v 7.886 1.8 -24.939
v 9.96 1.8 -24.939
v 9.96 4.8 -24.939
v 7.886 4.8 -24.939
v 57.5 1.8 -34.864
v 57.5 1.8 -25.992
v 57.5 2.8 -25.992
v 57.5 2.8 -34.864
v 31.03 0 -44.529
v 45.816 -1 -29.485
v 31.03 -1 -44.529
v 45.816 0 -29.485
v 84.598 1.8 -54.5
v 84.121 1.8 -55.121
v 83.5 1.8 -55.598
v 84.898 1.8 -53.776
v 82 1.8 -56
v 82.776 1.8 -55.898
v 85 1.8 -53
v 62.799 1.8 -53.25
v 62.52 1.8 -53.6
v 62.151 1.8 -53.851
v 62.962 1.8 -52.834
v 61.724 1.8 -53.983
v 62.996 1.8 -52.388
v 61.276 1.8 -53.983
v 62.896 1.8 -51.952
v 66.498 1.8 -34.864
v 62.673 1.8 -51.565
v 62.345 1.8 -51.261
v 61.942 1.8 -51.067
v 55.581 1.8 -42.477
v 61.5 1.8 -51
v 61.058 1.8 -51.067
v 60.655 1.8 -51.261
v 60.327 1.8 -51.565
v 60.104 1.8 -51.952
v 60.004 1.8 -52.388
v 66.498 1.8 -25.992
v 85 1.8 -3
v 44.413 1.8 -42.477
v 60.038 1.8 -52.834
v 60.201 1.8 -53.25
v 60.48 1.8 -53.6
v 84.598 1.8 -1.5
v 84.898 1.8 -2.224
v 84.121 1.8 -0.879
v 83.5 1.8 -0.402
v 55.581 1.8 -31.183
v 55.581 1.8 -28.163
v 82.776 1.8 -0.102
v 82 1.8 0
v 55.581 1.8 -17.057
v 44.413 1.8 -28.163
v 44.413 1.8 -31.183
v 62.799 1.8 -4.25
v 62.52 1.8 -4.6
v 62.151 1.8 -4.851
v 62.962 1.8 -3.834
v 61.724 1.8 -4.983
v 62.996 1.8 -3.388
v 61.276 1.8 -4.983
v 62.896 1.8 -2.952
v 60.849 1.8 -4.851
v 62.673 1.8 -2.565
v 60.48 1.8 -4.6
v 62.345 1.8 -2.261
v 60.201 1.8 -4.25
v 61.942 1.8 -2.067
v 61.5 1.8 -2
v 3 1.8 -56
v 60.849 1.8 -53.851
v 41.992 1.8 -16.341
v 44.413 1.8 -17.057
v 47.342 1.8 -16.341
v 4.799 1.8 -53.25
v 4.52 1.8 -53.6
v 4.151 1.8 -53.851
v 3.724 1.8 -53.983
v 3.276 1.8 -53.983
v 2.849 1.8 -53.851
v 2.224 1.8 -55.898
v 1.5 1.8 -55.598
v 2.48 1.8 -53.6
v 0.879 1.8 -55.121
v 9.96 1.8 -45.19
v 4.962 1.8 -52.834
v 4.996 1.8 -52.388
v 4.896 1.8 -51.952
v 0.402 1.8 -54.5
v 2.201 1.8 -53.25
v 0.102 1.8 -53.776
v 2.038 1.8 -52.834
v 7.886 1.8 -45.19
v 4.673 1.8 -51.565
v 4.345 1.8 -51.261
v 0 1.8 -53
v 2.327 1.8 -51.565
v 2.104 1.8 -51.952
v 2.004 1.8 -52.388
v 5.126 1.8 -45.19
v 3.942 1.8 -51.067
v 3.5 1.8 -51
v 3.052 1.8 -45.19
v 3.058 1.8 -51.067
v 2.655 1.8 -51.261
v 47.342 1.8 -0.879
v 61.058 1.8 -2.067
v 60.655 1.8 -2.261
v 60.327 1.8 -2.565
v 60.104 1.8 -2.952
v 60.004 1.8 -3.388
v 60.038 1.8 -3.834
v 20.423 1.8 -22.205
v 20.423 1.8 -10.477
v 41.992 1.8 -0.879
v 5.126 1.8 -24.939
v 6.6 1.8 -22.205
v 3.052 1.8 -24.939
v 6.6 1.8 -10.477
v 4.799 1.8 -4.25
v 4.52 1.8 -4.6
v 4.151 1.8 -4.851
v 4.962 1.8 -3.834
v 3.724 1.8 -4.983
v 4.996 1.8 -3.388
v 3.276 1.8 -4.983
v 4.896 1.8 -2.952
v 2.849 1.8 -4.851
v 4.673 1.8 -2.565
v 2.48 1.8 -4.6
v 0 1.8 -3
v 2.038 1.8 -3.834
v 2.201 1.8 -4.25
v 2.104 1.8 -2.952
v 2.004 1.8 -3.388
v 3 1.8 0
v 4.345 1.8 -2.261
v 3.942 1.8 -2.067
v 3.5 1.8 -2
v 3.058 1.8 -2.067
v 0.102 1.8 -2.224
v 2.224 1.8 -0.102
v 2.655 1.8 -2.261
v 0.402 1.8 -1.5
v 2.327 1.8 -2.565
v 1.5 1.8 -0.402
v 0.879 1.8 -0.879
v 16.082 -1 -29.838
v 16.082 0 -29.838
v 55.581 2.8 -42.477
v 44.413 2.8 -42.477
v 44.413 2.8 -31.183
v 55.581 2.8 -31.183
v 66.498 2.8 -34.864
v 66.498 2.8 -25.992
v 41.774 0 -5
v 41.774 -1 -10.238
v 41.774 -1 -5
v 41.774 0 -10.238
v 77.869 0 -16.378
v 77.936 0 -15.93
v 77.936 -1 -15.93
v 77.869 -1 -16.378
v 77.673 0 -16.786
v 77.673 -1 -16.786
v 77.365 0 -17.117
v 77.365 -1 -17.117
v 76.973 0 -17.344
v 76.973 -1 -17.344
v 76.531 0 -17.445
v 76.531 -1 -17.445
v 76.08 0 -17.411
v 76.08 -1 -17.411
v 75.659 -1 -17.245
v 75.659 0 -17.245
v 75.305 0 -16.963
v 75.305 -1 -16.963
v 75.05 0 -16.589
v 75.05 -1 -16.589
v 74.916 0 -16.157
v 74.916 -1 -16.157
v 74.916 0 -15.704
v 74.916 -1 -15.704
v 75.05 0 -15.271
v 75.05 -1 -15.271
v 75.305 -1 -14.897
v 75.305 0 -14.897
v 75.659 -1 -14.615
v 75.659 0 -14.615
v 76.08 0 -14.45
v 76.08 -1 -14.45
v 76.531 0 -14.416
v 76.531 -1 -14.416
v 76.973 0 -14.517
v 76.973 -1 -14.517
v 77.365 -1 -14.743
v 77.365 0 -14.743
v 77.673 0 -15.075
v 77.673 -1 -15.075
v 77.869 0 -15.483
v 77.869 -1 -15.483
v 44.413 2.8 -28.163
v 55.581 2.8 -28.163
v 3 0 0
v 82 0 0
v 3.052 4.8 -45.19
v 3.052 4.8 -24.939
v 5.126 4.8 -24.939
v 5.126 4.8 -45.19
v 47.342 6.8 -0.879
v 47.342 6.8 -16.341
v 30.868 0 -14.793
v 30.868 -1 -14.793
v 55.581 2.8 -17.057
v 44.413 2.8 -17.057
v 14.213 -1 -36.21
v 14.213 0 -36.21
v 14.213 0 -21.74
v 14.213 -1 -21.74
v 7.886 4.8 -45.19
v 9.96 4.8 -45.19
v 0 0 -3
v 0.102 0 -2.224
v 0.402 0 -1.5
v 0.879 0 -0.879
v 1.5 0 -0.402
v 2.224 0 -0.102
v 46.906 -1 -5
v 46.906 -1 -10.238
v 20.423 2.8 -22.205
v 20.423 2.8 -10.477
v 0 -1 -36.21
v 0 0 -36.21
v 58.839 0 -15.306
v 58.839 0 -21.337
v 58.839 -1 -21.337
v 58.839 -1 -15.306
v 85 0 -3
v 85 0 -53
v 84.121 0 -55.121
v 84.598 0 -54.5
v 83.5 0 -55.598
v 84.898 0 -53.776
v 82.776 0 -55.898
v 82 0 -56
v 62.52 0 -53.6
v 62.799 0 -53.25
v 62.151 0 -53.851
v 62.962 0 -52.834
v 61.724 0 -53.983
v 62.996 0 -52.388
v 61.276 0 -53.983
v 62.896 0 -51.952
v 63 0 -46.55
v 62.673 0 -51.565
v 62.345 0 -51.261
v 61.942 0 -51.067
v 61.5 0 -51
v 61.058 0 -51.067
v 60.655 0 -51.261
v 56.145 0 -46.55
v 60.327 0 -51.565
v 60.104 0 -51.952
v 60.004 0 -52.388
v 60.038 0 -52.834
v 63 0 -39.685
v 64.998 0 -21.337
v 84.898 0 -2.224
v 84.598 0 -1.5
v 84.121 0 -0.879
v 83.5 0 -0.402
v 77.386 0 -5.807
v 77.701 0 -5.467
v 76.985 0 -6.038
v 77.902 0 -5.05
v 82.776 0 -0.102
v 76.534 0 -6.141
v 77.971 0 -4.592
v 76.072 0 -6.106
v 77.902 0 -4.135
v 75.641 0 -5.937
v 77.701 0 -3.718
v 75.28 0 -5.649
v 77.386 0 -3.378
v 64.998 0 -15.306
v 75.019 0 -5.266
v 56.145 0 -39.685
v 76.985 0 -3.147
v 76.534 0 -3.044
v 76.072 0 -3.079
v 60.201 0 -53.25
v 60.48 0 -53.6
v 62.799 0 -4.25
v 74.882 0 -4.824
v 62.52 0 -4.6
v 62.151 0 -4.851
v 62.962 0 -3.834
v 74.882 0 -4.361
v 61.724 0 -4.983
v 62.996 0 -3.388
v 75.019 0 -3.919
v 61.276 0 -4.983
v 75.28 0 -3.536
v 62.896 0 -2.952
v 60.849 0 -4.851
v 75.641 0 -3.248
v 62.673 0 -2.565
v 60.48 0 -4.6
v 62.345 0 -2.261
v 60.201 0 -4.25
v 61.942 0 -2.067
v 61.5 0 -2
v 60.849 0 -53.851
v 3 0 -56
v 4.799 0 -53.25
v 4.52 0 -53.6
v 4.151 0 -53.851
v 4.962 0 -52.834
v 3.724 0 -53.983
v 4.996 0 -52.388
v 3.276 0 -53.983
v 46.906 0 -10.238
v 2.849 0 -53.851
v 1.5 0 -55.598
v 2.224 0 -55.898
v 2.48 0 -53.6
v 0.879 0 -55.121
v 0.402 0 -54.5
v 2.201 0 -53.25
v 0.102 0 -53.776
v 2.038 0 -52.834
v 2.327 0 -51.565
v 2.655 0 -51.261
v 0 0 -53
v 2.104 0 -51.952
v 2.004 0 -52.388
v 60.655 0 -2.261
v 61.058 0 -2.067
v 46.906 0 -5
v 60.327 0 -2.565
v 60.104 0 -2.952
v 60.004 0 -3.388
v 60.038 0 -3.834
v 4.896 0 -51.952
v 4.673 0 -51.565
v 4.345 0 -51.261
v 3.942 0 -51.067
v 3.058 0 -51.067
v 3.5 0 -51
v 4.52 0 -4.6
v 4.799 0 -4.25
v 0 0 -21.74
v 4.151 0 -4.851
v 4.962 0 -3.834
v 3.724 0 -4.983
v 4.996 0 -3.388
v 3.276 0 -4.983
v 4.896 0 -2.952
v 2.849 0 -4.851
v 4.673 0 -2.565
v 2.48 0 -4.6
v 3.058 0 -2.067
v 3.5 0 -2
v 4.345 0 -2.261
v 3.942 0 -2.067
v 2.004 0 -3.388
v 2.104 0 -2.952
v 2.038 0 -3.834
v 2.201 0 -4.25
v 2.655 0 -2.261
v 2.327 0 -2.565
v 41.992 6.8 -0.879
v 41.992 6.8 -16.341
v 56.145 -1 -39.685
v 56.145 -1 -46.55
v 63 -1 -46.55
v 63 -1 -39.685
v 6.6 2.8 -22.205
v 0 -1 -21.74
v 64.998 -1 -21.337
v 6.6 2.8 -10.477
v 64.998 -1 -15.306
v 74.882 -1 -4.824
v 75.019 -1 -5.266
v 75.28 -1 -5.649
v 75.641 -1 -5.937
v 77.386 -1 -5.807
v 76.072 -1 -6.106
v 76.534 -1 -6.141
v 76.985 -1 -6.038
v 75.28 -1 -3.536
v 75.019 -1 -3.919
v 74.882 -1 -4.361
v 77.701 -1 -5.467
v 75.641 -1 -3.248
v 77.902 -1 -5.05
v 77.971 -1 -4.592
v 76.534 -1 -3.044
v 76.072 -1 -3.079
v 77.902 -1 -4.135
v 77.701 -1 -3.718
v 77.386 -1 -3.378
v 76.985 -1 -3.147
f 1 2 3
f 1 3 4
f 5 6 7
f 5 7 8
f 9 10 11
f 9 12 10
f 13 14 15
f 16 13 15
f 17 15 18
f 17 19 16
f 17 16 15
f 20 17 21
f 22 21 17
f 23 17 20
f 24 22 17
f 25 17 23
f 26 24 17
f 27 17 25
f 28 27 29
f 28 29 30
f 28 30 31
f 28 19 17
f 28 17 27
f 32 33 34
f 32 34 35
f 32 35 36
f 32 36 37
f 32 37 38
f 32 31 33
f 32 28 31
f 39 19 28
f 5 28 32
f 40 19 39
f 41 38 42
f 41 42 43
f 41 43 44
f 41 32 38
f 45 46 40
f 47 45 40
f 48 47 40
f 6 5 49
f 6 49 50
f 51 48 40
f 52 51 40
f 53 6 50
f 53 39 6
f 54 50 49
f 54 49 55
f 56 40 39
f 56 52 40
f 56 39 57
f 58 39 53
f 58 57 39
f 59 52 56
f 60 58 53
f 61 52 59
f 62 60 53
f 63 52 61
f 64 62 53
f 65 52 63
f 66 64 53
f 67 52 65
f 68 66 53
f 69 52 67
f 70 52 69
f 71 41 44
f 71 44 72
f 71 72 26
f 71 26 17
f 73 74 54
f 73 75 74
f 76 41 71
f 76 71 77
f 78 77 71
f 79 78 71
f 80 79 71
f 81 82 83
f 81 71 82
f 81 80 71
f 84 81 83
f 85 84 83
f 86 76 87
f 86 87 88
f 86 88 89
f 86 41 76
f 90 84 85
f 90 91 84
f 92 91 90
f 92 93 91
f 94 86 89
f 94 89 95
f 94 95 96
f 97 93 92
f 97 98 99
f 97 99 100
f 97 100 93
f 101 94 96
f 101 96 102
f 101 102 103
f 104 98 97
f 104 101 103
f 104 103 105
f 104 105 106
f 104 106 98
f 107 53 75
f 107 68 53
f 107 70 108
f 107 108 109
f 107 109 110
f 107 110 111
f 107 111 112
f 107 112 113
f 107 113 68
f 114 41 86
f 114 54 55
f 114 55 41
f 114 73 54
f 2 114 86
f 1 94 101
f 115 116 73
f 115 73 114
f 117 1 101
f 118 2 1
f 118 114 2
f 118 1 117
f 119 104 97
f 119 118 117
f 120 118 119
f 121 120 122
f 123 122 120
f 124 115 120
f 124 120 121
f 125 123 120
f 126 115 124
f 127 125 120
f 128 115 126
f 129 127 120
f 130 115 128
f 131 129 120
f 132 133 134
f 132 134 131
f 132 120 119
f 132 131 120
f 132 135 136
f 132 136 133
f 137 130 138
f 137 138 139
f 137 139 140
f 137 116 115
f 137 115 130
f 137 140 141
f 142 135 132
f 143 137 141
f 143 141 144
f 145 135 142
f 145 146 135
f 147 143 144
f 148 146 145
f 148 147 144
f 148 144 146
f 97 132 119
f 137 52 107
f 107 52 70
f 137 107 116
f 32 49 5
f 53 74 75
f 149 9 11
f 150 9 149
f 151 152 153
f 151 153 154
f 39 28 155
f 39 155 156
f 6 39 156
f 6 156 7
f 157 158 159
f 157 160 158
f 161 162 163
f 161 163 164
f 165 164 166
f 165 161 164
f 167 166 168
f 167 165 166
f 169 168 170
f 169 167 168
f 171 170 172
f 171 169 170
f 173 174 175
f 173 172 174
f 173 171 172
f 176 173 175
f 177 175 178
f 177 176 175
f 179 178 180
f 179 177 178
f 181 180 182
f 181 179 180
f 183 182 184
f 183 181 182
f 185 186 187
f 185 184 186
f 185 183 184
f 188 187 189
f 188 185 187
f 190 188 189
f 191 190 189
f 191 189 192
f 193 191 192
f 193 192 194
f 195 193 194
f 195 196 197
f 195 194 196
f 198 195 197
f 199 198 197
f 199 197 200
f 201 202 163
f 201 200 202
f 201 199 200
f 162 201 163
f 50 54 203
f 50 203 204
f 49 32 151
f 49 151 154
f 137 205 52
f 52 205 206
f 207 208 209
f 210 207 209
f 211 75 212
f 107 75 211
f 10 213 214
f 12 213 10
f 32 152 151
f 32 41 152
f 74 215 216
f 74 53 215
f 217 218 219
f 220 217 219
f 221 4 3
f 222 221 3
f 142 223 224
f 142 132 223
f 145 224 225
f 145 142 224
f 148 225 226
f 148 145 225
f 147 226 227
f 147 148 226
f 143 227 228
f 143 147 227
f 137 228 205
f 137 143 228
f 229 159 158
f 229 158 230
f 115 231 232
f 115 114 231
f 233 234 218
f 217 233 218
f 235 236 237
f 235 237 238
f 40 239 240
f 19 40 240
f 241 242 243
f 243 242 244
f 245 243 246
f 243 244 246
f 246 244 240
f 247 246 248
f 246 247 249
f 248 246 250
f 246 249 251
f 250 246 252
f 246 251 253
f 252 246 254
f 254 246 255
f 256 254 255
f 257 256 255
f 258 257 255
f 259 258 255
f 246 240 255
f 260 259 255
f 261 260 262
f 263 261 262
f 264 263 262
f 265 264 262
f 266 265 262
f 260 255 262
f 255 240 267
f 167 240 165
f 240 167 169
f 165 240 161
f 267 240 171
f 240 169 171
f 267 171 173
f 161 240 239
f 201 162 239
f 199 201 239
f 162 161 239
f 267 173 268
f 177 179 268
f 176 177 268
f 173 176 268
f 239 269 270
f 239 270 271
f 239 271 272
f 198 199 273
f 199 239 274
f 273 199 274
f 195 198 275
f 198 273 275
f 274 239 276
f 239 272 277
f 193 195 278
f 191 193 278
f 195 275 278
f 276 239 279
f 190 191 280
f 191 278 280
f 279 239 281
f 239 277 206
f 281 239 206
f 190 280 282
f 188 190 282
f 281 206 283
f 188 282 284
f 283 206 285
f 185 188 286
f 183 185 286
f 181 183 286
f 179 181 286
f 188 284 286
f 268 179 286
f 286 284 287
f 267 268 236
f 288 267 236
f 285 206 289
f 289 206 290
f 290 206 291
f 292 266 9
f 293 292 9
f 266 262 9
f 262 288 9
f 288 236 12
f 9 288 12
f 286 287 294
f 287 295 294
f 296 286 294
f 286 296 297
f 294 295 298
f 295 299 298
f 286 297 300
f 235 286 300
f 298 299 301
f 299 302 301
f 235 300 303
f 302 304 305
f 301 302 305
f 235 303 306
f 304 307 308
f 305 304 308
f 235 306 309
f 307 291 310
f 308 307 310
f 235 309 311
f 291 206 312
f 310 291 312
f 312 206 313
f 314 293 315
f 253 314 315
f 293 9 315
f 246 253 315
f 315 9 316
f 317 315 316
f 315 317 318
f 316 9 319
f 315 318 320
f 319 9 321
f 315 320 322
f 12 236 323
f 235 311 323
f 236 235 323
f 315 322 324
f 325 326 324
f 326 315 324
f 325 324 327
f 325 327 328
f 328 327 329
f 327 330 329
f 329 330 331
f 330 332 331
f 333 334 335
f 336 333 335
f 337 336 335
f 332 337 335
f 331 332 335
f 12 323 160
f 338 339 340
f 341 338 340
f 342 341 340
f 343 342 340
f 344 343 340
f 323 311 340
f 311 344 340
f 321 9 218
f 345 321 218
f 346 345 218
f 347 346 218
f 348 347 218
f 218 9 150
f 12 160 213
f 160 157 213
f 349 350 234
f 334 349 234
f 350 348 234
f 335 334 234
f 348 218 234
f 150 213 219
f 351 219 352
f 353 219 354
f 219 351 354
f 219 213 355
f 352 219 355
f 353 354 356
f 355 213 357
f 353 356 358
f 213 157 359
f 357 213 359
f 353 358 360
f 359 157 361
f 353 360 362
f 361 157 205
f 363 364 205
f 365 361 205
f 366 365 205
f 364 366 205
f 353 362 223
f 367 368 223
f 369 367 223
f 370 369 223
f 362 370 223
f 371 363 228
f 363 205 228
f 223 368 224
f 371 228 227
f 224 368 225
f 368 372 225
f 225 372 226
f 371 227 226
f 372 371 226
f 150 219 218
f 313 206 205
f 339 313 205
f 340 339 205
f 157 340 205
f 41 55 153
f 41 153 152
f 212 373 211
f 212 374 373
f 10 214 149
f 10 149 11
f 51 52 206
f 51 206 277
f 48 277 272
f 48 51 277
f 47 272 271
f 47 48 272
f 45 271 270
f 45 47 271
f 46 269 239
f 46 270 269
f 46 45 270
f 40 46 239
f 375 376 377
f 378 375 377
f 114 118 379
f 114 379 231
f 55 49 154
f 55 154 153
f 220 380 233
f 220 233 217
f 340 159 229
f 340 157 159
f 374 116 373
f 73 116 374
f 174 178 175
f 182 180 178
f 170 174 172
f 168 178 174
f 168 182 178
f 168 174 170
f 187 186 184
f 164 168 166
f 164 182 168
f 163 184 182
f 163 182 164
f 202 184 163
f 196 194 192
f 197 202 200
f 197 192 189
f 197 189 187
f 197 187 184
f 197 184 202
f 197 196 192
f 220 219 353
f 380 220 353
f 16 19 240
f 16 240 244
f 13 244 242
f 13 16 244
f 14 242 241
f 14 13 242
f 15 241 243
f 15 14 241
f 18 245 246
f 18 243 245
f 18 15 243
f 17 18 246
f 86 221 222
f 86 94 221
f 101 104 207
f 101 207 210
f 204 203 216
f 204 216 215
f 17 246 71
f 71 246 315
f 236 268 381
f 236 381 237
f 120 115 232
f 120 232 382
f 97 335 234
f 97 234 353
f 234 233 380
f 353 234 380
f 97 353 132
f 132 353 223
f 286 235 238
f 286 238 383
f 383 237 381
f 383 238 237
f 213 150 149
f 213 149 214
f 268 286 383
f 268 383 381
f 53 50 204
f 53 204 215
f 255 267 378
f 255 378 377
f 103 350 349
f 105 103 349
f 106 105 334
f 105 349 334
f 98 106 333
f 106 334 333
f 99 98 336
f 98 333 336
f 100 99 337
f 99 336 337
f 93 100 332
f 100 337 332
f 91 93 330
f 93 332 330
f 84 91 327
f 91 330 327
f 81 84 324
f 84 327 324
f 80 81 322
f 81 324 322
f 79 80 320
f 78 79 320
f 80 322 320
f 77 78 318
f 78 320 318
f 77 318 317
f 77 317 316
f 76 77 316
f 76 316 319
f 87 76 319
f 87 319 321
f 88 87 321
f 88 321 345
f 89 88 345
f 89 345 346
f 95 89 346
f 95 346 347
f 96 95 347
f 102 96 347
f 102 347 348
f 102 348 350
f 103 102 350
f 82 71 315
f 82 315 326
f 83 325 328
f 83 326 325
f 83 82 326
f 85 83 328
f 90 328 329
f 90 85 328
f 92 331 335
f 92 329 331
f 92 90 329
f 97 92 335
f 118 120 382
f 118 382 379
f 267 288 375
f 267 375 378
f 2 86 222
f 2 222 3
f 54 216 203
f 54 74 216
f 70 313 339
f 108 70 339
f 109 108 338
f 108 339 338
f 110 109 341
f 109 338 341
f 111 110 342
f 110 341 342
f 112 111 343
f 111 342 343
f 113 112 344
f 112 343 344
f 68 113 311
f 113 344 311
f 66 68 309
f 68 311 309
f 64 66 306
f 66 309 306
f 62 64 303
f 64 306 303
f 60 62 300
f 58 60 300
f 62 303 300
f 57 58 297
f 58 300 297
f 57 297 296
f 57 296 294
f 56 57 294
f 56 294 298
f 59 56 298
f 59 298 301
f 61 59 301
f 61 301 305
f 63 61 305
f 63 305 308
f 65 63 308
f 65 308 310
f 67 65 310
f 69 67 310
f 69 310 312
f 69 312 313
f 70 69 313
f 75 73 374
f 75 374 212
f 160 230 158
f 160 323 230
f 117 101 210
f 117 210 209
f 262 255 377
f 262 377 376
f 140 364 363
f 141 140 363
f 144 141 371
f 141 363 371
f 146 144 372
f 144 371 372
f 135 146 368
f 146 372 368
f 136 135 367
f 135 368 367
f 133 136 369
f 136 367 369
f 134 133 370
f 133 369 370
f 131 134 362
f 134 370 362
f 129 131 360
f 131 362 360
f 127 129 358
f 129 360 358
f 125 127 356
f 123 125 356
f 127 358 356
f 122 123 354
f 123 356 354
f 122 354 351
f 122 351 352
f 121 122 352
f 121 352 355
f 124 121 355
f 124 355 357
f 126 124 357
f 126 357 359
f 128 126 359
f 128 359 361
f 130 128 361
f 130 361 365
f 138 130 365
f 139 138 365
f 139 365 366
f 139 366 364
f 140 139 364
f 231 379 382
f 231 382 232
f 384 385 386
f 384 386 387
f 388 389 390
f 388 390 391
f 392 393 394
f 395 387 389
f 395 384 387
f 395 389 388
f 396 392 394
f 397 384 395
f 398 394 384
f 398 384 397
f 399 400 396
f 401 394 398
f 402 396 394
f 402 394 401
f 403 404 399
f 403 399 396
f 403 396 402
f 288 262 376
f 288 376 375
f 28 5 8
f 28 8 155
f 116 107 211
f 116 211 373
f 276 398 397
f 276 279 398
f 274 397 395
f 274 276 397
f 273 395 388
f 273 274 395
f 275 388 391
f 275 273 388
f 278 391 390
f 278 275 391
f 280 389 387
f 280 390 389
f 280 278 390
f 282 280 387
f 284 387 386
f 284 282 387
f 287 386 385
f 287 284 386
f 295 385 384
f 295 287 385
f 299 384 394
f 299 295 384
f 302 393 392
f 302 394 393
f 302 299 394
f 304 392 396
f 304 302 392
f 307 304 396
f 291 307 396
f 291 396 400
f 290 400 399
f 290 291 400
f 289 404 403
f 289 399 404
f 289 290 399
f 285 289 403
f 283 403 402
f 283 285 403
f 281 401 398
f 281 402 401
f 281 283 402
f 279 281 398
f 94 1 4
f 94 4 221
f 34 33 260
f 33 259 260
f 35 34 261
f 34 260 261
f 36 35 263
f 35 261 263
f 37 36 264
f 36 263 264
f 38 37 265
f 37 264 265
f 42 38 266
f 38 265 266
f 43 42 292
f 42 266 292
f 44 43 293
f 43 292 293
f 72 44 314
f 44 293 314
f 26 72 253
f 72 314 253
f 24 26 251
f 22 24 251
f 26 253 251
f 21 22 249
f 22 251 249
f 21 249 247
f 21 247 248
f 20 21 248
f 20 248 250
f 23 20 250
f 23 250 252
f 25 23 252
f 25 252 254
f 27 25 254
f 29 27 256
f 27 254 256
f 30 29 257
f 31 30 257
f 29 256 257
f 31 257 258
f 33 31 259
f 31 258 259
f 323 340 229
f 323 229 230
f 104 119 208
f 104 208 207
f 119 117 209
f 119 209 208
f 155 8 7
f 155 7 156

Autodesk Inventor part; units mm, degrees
ref_plane "YZ Plane" through (0, 0, 0) normal (1, 0, 0) x (0, 1, 0)
ref_plane "XZ Plane" through (0, 0, 0) normal (0, 1, 0) x (-1, 0, 0)
ref_plane "XY Plane" through (0, 0, 0) normal (0, 0, 1) x (1, 0, 0)
sketch "Sketch1" plane through (0, 0, 0) normal (0, 1, 0) x (-1, 0, 0)
  line L0 (0, 0) -> (-85, 0)
  line L1 (-85, 0) -> (-85, -56)
  line L2 (-85, -56) -> (0, -56)
  line L3 (0, -56) -> (0, 0)
  dimension "d0" = 85
  dimension "d1" = 56
extrude "Extrusion1" add sketch "Sketch1" along normal blind 1.8
fillet "Fillet1" radius 3 4 edges at (0, 0.9, 0) (85, 0.9, 0) (85, 0.9, -56) (0, 0.9, -56)
sketch "Sketch2" plane through (0, 1.8, 0) normal (0, 1, 0) x (1, 0, 0)
  line L0 (0, 53) -> (0, 3) projected
  line L1 (3, 0) -> (82, 0) projected
  line L2 (82, 56) -> (3, 56) projected
  point P0 (0, 0)
  point P1 (3.5, 52.5)
  point P2 (61.5, 52.5)
  point P3 (3.5, 3.5)
  point P4 (61.5, 3.5)
  dimension "d5" = 58
  dimension "d7" = 49
  dimension "d8" = 3.5
  dimension "d9" = 3.5
  dimension "d10" = 3.5
  dimension "d11" = 3.5
  dimension "d12" = 3.5
  dimension "d13" = 3.5
hole "Hole1" at (3.5, 1.8, -52.5) at (61.5, 1.8, -52.5) at (3.5, 1.8, -3.5) at (61.5, 1.8, -3.5) direction (0, -1, 0) diameter 3 end through all
sketch "Sketch3" plane through (0, 0, 0) normal (0, -1, 0) x (1, 0, 0)
  line L0 (0, -53) -> (0, -3) projected
  line L1 (14.2126, -21.7399) -> (0, -21.7399)
  line L2 (0, -21.7399) -> (0, -36.2099)
  line L3 (0, -36.2099) -> (14.2126, -36.2099)
  line L4 (14.2126, -36.2099) -> (14.2126, -21.7399)
  line L5 (41.7741, -5) -> (46.9065, -5)
  line L6 (46.9065, -5) -> (46.9065, -10.2381)
  line L7 (46.9065, -10.2381) -> (41.7741, -10.2381)
  line L8 (41.7741, -10.2381) -> (41.7741, -5)
  line L9 (58.8394, -15.3064) -> (64.9983, -15.3064)
  line L10 (64.9983, -15.3064) -> (64.9983, -21.337)
  line L11 (64.9983, -21.337) -> (58.8394, -21.337)
  line L12 (58.8394, -21.337) -> (58.8394, -15.3064)
  line L13 (56.1449, -39.6854) -> (63, -39.6854)
  line L14 (63, -39.6854) -> (63, -46.55)
  line L15 (63, -46.55) -> (56.1449, -46.55)
  line L16 (56.1449, -46.55) -> (56.1449, -39.6854)
  line L17 (30.8677, -14.7931) -> (45.8159, -29.4847)
  line L18 (45.8159, -29.4847) -> (31.0297, -44.5291)
  line L19 (31.0297, -44.5291) -> (16.0816, -29.8375)
  line L20 (16.0816, -29.8375) -> (30.8677, -14.7931)
  circle A0 centre (76.4179, -4.5925) radius 1.5529
  circle A1 centre (76.4179, -15.9302) radius 1.5186
  point P0 (0, 0)
extrude "Extrusion2" add sketch "Sketch3" along normal blind 1
sketch "Sketch4" plane through (0, 1.8, 0) normal (0, 1, 0) x (1, 0, 0)
  line L0 (6.6003, 22.2047) -> (20.4228, 22.2047)
  line L1 (20.4228, 22.2047) -> (20.4228, 10.4766)
  line L2 (20.4228, 10.4766) -> (6.6003, 10.4766)
  line L3 (6.6003, 10.4766) -> (6.6003, 22.2047)
  line L4 (44.413, 42.4767) -> (55.5812, 42.4767)
  line L5 (55.5812, 42.4767) -> (55.5812, 31.1828)
  line L6 (55.5812, 31.1828) -> (44.413, 31.1828)
  line L7 (44.413, 31.1828) -> (44.413, 42.4767)
  line L8 (44.413, 28.1626) -> (55.5812, 28.1626)
  line L9 (55.5812, 28.1626) -> (55.5812, 17.0574)
  line L10 (55.5812, 17.0574) -> (44.413, 17.0574)
  line L11 (44.413, 17.0574) -> (44.413, 28.1626)
  line L12 (57.5002, 34.8635) -> (66.4976, 34.8635)
  line L13 (66.4976, 34.8635) -> (66.4976, 25.9919)
  line L14 (66.4976, 25.9919) -> (57.5002, 25.9919)
  line L15 (57.5002, 25.9919) -> (57.5002, 34.8635)
  point P0 (0, 0)
extrude "Extrusion3" add sketch "Sketch4" along normal blind 1
sketch "Sketch5" plane through (0, 1.8, 0) normal (0, 1, 0) x (1, 0, 0)
  line L0 (3.0525, 45.1901) -> (5.1263, 45.1901)
  line L1 (5.1263, 45.1901) -> (5.1263, 24.9394)
  line L2 (5.1263, 24.9394) -> (3.0525, 24.9394)
  line L3 (3.0525, 24.9394) -> (3.0525, 45.1901)
  line L4 (7.8863, 45.1901) -> (9.9602, 45.1901)
  line L5 (9.9602, 45.1901) -> (9.9602, 24.9394)
  line L6 (9.9602, 24.9394) -> (7.8863, 24.9394)
  line L7 (7.8863, 24.9394) -> (7.8863, 45.1901)
  point P0 (0, 0)
  dimension "d25" = 0
extrude "Extrusion4" add sketch "Sketch5" along normal blind 3
sketch "Sketch6" plane through (0, 1.8, 0) normal (0, 1, 0) x (1, 0, 0)
  line L0 (41.9919, 16.3406) -> (47.3417, 16.3406)
  line L1 (47.3417, 16.3406) -> (47.3417, 0.8787)
  line L2 (47.3417, 0.8787) -> (41.9919, 0.8787)
  line L3 (41.9919, 0.8787) -> (41.9919, 16.3406)
  point P0 (0, 0)
extrude "Extrusion5" add sketch "Sketch6" along normal blind 5
properties part number "nanopi_m4_board"
